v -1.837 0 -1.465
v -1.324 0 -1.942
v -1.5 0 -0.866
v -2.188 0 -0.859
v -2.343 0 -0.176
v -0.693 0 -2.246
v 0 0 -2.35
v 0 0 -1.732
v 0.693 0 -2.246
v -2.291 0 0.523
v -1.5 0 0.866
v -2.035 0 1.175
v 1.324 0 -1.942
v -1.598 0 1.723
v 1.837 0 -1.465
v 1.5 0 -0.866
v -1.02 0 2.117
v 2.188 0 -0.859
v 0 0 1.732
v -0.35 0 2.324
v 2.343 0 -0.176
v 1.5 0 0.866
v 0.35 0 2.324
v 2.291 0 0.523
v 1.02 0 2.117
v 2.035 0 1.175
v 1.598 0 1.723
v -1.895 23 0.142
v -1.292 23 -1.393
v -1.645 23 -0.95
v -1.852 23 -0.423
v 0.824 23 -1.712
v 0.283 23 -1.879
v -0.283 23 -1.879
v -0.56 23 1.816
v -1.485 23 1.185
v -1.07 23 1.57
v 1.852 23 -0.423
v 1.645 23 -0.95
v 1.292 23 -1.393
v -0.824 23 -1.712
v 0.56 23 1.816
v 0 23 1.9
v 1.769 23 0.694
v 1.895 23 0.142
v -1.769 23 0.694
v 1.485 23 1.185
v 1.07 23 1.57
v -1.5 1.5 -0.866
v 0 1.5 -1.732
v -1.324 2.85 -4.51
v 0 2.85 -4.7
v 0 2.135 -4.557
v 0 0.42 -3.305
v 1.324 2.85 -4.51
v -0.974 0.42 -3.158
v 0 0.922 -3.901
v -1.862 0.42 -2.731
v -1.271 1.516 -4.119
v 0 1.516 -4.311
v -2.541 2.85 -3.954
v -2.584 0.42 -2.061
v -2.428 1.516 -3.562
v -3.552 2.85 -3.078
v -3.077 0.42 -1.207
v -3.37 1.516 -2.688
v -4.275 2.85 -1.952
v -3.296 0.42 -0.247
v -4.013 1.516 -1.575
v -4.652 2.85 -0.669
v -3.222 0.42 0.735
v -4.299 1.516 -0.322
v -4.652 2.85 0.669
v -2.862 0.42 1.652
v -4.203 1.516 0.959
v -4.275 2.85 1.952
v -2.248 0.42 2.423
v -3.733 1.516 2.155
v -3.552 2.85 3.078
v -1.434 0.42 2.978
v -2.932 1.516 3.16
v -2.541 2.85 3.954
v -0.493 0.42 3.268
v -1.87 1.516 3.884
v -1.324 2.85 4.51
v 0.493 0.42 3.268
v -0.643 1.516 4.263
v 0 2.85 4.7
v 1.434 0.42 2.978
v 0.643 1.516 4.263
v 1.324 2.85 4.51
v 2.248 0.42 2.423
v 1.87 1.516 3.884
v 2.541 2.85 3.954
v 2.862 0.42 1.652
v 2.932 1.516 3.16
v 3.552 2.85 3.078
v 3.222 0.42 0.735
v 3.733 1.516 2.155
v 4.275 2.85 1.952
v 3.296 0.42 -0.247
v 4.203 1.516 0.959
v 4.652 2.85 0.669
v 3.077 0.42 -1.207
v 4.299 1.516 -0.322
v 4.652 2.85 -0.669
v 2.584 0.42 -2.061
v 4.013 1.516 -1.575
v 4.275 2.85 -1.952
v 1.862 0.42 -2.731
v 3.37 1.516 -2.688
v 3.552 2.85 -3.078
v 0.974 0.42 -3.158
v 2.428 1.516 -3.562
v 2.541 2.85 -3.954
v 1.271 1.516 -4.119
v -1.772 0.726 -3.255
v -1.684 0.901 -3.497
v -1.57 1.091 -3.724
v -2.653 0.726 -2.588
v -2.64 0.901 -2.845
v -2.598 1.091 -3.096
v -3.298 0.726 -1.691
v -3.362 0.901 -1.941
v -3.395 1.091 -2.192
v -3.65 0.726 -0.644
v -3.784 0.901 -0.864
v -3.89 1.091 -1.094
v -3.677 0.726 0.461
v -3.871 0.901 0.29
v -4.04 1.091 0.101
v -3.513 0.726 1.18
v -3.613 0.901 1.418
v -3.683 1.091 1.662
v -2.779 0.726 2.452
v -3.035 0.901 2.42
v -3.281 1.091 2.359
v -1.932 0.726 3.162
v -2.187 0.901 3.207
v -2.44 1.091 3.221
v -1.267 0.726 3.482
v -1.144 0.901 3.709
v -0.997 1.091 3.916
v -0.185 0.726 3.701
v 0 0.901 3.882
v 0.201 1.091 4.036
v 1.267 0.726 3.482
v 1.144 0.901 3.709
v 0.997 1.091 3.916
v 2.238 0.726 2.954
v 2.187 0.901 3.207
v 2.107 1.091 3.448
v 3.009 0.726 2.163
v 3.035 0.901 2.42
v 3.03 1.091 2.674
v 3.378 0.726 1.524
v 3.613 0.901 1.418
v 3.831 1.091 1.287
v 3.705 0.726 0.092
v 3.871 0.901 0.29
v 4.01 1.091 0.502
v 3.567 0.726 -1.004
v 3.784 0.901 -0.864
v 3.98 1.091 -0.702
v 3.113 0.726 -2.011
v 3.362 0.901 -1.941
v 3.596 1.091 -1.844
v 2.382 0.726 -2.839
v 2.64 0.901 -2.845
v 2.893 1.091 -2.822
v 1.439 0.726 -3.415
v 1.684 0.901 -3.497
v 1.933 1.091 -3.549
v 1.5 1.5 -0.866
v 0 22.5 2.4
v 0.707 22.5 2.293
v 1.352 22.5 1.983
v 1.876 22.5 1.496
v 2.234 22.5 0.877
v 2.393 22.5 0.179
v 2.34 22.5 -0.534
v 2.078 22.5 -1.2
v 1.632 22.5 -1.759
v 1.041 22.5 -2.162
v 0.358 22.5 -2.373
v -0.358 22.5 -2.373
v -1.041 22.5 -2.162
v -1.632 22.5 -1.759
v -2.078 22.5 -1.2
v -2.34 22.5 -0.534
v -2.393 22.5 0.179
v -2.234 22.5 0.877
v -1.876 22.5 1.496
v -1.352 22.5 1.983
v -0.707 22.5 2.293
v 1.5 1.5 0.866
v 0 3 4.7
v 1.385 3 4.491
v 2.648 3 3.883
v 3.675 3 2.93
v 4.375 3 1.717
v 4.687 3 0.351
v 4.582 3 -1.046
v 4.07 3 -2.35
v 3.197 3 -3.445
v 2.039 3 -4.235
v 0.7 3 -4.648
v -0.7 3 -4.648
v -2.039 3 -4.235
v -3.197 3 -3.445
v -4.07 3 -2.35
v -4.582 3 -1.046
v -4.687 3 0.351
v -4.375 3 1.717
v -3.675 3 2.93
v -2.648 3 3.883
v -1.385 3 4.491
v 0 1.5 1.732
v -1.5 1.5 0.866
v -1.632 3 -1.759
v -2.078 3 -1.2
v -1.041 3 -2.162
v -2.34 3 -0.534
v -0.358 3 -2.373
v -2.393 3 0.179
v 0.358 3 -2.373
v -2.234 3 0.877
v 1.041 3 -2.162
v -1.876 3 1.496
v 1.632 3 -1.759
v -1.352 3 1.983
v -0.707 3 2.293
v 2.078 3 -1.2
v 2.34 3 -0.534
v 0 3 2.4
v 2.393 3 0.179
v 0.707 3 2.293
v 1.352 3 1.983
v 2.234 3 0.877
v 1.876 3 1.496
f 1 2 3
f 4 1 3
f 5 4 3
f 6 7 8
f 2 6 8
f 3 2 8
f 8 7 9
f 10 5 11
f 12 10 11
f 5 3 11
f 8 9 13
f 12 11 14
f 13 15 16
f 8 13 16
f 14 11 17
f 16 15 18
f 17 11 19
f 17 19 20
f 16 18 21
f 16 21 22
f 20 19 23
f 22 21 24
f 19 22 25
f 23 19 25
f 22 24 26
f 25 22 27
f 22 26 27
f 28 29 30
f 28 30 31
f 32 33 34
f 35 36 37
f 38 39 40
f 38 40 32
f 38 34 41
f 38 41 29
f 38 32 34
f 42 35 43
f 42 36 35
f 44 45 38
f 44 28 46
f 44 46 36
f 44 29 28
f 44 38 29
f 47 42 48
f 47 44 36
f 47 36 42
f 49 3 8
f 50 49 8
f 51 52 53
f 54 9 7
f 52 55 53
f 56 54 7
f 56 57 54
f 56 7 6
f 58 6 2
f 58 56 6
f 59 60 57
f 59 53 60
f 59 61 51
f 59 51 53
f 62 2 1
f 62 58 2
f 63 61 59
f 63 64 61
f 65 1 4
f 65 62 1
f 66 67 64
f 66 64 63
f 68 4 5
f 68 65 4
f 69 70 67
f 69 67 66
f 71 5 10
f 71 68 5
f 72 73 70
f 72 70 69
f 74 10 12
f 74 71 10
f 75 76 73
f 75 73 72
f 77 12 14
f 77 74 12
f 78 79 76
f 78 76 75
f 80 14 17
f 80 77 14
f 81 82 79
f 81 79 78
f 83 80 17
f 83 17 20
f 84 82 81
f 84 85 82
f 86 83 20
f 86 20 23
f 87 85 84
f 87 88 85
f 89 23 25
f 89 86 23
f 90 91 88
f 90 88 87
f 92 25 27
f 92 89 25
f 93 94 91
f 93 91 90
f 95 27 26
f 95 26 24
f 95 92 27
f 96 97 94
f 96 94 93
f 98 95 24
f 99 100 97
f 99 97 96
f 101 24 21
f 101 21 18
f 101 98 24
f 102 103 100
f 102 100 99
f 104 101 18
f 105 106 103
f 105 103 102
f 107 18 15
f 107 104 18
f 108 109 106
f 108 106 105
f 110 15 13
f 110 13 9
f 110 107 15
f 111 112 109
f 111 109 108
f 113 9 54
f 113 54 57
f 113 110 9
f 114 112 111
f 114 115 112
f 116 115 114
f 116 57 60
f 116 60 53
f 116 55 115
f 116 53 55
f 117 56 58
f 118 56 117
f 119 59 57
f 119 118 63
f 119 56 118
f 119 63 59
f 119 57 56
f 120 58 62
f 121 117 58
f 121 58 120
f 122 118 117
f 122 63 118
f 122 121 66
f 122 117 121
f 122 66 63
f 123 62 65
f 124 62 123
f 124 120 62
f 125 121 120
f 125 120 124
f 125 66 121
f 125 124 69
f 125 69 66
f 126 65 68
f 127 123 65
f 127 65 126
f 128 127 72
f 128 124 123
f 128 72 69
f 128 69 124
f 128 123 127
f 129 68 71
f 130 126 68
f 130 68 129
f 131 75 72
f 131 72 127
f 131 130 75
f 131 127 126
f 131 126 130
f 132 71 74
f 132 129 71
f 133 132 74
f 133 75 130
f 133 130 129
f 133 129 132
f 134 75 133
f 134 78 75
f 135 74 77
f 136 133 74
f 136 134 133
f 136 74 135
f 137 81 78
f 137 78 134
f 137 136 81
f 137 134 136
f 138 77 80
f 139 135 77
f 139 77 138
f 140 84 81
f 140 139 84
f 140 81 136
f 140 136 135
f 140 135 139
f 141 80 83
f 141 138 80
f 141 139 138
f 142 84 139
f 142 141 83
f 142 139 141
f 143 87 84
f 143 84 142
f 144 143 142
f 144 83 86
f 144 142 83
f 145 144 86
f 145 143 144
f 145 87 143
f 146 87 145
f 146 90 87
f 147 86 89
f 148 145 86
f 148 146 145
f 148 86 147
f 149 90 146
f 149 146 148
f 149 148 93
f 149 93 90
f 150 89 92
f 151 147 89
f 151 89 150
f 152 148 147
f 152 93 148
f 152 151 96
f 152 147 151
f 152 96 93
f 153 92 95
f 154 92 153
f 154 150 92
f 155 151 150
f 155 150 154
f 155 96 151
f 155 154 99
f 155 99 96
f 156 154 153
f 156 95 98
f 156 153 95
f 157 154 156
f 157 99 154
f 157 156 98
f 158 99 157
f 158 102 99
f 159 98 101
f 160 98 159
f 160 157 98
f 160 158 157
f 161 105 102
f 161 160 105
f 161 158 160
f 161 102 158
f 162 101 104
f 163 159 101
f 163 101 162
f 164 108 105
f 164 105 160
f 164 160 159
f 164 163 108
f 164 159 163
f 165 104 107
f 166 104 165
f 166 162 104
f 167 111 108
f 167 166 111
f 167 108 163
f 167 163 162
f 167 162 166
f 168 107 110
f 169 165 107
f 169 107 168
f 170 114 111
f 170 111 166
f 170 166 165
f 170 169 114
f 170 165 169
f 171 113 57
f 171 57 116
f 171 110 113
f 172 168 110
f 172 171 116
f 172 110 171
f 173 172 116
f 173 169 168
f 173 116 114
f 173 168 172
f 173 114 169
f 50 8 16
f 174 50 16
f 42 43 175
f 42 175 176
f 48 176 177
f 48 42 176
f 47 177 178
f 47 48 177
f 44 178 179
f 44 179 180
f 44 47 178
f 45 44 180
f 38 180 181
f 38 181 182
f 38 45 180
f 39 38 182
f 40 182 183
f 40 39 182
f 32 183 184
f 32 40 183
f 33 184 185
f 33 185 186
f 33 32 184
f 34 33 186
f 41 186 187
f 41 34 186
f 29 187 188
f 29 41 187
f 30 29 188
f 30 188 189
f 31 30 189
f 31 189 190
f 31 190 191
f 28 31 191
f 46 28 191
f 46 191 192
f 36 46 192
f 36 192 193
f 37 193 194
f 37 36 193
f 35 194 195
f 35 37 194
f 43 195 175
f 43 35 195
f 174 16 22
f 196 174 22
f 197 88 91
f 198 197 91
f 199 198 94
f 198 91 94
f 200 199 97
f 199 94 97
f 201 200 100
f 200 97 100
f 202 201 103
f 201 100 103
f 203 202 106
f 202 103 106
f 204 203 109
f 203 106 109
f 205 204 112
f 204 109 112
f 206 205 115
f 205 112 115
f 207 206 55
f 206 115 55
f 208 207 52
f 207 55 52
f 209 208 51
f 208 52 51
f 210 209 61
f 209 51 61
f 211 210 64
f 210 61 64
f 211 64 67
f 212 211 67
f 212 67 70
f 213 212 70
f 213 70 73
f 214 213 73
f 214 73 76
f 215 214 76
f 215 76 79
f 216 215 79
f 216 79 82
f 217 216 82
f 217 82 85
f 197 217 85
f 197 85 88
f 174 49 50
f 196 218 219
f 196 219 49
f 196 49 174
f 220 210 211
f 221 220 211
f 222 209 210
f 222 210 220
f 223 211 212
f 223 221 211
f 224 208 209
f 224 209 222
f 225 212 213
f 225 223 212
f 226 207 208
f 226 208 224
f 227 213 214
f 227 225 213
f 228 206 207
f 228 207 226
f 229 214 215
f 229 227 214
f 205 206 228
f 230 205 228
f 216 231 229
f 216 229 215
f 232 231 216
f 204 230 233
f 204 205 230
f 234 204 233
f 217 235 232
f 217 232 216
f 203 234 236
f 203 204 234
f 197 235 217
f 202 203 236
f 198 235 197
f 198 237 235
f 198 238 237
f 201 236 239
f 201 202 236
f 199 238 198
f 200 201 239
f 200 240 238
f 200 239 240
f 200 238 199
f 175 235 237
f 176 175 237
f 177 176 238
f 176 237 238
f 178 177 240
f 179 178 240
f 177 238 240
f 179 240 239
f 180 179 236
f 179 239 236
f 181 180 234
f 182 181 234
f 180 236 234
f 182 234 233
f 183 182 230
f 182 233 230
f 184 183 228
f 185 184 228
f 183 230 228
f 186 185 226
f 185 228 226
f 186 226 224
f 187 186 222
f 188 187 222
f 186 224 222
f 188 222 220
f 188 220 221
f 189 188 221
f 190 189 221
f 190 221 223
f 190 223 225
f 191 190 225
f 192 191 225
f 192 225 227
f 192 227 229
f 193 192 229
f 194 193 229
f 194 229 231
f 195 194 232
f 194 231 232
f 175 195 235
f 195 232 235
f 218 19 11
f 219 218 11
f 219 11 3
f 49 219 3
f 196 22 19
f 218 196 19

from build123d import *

# Parameters (mm, degrees)
SKETCH1_R           = 4.7
BOSS_EXTRUDE1_DEPTH = 3
SKETCH2_R           = 2.4
BOSS_EXTRUDE2_DEPTH = 20
CUT_EXTRUDE1_DEPTH  = 1.5
CHAMFER1_SIZE       = 0.5


with BuildPart() as part:
    # Sketch1 → Boss-Extrude1 (new body)
    with BuildSketch(Plane(origin=(0, 0, 0), x_dir=(1, 0, 0), z_dir=(0, 1, 0))):
        with Locations(Location((0, 0, 0), (0, 0, 270))):
            Circle(SKETCH1_R)
    extrude(amount=BOSS_EXTRUDE1_DEPTH)

    # Sketch2 → Boss-Extrude2 (add)
    with BuildSketch(Plane(origin=(0, 3, 0), x_dir=(1, 0, 0), z_dir=(0, 1, 0))):
        with Locations(Location((0, 0, 0), (0, 0, 270))):
            Circle(SKETCH2_R)
    extrude(amount=BOSS_EXTRUDE2_DEPTH)

    # Sketch3 → Cut-Revolve1 (revolve, cut)
    with BuildSketch(Plane.XY, mode=Mode.PRIVATE) as cut_revolve1_sk:
        with BuildLine():
            Line((2.35, 0), (4.7, 0))
            Line((4.7, 0), (4.7, 2.85))
            add(Edge.make_bspline(
                [(2.35, 0), (4.432462228, 0.599611143), (4.7, 2.85)],
                knots=[0, 0, 0, 1, 1, 1], degree=2))
        make_face()
    revolve(cut_revolve1_sk.sketch.rotate(Axis((0, 0, 0), (0, 1, 0)), 90), axis=Axis((0, 0, 0), (0, 1, 0)), mode=Mode.SUBTRACT)

    # Sketch4 → Cut-Extrude1 (cut)
    with BuildSketch(Plane.XZ):
        Polygon((0, 1.732050808), (-1.5, 0.866025404), (-1.5, -0.866025404), (0, -1.732050808), (1.5, -0.866025404), (1.5, 0.866025404), align=None)
    extrude(amount=-CUT_EXTRUDE1_DEPTH, mode=Mode.SUBTRACT)

    # Chamfer1
    chamfer1_edges = [part.edges().sort_by_distance(p)[0] for p in [
        (0, 23, -2.4),
    ]]
    chamfer(chamfer1_edges, length=CHAMFER1_SIZE)


solid = part.part
